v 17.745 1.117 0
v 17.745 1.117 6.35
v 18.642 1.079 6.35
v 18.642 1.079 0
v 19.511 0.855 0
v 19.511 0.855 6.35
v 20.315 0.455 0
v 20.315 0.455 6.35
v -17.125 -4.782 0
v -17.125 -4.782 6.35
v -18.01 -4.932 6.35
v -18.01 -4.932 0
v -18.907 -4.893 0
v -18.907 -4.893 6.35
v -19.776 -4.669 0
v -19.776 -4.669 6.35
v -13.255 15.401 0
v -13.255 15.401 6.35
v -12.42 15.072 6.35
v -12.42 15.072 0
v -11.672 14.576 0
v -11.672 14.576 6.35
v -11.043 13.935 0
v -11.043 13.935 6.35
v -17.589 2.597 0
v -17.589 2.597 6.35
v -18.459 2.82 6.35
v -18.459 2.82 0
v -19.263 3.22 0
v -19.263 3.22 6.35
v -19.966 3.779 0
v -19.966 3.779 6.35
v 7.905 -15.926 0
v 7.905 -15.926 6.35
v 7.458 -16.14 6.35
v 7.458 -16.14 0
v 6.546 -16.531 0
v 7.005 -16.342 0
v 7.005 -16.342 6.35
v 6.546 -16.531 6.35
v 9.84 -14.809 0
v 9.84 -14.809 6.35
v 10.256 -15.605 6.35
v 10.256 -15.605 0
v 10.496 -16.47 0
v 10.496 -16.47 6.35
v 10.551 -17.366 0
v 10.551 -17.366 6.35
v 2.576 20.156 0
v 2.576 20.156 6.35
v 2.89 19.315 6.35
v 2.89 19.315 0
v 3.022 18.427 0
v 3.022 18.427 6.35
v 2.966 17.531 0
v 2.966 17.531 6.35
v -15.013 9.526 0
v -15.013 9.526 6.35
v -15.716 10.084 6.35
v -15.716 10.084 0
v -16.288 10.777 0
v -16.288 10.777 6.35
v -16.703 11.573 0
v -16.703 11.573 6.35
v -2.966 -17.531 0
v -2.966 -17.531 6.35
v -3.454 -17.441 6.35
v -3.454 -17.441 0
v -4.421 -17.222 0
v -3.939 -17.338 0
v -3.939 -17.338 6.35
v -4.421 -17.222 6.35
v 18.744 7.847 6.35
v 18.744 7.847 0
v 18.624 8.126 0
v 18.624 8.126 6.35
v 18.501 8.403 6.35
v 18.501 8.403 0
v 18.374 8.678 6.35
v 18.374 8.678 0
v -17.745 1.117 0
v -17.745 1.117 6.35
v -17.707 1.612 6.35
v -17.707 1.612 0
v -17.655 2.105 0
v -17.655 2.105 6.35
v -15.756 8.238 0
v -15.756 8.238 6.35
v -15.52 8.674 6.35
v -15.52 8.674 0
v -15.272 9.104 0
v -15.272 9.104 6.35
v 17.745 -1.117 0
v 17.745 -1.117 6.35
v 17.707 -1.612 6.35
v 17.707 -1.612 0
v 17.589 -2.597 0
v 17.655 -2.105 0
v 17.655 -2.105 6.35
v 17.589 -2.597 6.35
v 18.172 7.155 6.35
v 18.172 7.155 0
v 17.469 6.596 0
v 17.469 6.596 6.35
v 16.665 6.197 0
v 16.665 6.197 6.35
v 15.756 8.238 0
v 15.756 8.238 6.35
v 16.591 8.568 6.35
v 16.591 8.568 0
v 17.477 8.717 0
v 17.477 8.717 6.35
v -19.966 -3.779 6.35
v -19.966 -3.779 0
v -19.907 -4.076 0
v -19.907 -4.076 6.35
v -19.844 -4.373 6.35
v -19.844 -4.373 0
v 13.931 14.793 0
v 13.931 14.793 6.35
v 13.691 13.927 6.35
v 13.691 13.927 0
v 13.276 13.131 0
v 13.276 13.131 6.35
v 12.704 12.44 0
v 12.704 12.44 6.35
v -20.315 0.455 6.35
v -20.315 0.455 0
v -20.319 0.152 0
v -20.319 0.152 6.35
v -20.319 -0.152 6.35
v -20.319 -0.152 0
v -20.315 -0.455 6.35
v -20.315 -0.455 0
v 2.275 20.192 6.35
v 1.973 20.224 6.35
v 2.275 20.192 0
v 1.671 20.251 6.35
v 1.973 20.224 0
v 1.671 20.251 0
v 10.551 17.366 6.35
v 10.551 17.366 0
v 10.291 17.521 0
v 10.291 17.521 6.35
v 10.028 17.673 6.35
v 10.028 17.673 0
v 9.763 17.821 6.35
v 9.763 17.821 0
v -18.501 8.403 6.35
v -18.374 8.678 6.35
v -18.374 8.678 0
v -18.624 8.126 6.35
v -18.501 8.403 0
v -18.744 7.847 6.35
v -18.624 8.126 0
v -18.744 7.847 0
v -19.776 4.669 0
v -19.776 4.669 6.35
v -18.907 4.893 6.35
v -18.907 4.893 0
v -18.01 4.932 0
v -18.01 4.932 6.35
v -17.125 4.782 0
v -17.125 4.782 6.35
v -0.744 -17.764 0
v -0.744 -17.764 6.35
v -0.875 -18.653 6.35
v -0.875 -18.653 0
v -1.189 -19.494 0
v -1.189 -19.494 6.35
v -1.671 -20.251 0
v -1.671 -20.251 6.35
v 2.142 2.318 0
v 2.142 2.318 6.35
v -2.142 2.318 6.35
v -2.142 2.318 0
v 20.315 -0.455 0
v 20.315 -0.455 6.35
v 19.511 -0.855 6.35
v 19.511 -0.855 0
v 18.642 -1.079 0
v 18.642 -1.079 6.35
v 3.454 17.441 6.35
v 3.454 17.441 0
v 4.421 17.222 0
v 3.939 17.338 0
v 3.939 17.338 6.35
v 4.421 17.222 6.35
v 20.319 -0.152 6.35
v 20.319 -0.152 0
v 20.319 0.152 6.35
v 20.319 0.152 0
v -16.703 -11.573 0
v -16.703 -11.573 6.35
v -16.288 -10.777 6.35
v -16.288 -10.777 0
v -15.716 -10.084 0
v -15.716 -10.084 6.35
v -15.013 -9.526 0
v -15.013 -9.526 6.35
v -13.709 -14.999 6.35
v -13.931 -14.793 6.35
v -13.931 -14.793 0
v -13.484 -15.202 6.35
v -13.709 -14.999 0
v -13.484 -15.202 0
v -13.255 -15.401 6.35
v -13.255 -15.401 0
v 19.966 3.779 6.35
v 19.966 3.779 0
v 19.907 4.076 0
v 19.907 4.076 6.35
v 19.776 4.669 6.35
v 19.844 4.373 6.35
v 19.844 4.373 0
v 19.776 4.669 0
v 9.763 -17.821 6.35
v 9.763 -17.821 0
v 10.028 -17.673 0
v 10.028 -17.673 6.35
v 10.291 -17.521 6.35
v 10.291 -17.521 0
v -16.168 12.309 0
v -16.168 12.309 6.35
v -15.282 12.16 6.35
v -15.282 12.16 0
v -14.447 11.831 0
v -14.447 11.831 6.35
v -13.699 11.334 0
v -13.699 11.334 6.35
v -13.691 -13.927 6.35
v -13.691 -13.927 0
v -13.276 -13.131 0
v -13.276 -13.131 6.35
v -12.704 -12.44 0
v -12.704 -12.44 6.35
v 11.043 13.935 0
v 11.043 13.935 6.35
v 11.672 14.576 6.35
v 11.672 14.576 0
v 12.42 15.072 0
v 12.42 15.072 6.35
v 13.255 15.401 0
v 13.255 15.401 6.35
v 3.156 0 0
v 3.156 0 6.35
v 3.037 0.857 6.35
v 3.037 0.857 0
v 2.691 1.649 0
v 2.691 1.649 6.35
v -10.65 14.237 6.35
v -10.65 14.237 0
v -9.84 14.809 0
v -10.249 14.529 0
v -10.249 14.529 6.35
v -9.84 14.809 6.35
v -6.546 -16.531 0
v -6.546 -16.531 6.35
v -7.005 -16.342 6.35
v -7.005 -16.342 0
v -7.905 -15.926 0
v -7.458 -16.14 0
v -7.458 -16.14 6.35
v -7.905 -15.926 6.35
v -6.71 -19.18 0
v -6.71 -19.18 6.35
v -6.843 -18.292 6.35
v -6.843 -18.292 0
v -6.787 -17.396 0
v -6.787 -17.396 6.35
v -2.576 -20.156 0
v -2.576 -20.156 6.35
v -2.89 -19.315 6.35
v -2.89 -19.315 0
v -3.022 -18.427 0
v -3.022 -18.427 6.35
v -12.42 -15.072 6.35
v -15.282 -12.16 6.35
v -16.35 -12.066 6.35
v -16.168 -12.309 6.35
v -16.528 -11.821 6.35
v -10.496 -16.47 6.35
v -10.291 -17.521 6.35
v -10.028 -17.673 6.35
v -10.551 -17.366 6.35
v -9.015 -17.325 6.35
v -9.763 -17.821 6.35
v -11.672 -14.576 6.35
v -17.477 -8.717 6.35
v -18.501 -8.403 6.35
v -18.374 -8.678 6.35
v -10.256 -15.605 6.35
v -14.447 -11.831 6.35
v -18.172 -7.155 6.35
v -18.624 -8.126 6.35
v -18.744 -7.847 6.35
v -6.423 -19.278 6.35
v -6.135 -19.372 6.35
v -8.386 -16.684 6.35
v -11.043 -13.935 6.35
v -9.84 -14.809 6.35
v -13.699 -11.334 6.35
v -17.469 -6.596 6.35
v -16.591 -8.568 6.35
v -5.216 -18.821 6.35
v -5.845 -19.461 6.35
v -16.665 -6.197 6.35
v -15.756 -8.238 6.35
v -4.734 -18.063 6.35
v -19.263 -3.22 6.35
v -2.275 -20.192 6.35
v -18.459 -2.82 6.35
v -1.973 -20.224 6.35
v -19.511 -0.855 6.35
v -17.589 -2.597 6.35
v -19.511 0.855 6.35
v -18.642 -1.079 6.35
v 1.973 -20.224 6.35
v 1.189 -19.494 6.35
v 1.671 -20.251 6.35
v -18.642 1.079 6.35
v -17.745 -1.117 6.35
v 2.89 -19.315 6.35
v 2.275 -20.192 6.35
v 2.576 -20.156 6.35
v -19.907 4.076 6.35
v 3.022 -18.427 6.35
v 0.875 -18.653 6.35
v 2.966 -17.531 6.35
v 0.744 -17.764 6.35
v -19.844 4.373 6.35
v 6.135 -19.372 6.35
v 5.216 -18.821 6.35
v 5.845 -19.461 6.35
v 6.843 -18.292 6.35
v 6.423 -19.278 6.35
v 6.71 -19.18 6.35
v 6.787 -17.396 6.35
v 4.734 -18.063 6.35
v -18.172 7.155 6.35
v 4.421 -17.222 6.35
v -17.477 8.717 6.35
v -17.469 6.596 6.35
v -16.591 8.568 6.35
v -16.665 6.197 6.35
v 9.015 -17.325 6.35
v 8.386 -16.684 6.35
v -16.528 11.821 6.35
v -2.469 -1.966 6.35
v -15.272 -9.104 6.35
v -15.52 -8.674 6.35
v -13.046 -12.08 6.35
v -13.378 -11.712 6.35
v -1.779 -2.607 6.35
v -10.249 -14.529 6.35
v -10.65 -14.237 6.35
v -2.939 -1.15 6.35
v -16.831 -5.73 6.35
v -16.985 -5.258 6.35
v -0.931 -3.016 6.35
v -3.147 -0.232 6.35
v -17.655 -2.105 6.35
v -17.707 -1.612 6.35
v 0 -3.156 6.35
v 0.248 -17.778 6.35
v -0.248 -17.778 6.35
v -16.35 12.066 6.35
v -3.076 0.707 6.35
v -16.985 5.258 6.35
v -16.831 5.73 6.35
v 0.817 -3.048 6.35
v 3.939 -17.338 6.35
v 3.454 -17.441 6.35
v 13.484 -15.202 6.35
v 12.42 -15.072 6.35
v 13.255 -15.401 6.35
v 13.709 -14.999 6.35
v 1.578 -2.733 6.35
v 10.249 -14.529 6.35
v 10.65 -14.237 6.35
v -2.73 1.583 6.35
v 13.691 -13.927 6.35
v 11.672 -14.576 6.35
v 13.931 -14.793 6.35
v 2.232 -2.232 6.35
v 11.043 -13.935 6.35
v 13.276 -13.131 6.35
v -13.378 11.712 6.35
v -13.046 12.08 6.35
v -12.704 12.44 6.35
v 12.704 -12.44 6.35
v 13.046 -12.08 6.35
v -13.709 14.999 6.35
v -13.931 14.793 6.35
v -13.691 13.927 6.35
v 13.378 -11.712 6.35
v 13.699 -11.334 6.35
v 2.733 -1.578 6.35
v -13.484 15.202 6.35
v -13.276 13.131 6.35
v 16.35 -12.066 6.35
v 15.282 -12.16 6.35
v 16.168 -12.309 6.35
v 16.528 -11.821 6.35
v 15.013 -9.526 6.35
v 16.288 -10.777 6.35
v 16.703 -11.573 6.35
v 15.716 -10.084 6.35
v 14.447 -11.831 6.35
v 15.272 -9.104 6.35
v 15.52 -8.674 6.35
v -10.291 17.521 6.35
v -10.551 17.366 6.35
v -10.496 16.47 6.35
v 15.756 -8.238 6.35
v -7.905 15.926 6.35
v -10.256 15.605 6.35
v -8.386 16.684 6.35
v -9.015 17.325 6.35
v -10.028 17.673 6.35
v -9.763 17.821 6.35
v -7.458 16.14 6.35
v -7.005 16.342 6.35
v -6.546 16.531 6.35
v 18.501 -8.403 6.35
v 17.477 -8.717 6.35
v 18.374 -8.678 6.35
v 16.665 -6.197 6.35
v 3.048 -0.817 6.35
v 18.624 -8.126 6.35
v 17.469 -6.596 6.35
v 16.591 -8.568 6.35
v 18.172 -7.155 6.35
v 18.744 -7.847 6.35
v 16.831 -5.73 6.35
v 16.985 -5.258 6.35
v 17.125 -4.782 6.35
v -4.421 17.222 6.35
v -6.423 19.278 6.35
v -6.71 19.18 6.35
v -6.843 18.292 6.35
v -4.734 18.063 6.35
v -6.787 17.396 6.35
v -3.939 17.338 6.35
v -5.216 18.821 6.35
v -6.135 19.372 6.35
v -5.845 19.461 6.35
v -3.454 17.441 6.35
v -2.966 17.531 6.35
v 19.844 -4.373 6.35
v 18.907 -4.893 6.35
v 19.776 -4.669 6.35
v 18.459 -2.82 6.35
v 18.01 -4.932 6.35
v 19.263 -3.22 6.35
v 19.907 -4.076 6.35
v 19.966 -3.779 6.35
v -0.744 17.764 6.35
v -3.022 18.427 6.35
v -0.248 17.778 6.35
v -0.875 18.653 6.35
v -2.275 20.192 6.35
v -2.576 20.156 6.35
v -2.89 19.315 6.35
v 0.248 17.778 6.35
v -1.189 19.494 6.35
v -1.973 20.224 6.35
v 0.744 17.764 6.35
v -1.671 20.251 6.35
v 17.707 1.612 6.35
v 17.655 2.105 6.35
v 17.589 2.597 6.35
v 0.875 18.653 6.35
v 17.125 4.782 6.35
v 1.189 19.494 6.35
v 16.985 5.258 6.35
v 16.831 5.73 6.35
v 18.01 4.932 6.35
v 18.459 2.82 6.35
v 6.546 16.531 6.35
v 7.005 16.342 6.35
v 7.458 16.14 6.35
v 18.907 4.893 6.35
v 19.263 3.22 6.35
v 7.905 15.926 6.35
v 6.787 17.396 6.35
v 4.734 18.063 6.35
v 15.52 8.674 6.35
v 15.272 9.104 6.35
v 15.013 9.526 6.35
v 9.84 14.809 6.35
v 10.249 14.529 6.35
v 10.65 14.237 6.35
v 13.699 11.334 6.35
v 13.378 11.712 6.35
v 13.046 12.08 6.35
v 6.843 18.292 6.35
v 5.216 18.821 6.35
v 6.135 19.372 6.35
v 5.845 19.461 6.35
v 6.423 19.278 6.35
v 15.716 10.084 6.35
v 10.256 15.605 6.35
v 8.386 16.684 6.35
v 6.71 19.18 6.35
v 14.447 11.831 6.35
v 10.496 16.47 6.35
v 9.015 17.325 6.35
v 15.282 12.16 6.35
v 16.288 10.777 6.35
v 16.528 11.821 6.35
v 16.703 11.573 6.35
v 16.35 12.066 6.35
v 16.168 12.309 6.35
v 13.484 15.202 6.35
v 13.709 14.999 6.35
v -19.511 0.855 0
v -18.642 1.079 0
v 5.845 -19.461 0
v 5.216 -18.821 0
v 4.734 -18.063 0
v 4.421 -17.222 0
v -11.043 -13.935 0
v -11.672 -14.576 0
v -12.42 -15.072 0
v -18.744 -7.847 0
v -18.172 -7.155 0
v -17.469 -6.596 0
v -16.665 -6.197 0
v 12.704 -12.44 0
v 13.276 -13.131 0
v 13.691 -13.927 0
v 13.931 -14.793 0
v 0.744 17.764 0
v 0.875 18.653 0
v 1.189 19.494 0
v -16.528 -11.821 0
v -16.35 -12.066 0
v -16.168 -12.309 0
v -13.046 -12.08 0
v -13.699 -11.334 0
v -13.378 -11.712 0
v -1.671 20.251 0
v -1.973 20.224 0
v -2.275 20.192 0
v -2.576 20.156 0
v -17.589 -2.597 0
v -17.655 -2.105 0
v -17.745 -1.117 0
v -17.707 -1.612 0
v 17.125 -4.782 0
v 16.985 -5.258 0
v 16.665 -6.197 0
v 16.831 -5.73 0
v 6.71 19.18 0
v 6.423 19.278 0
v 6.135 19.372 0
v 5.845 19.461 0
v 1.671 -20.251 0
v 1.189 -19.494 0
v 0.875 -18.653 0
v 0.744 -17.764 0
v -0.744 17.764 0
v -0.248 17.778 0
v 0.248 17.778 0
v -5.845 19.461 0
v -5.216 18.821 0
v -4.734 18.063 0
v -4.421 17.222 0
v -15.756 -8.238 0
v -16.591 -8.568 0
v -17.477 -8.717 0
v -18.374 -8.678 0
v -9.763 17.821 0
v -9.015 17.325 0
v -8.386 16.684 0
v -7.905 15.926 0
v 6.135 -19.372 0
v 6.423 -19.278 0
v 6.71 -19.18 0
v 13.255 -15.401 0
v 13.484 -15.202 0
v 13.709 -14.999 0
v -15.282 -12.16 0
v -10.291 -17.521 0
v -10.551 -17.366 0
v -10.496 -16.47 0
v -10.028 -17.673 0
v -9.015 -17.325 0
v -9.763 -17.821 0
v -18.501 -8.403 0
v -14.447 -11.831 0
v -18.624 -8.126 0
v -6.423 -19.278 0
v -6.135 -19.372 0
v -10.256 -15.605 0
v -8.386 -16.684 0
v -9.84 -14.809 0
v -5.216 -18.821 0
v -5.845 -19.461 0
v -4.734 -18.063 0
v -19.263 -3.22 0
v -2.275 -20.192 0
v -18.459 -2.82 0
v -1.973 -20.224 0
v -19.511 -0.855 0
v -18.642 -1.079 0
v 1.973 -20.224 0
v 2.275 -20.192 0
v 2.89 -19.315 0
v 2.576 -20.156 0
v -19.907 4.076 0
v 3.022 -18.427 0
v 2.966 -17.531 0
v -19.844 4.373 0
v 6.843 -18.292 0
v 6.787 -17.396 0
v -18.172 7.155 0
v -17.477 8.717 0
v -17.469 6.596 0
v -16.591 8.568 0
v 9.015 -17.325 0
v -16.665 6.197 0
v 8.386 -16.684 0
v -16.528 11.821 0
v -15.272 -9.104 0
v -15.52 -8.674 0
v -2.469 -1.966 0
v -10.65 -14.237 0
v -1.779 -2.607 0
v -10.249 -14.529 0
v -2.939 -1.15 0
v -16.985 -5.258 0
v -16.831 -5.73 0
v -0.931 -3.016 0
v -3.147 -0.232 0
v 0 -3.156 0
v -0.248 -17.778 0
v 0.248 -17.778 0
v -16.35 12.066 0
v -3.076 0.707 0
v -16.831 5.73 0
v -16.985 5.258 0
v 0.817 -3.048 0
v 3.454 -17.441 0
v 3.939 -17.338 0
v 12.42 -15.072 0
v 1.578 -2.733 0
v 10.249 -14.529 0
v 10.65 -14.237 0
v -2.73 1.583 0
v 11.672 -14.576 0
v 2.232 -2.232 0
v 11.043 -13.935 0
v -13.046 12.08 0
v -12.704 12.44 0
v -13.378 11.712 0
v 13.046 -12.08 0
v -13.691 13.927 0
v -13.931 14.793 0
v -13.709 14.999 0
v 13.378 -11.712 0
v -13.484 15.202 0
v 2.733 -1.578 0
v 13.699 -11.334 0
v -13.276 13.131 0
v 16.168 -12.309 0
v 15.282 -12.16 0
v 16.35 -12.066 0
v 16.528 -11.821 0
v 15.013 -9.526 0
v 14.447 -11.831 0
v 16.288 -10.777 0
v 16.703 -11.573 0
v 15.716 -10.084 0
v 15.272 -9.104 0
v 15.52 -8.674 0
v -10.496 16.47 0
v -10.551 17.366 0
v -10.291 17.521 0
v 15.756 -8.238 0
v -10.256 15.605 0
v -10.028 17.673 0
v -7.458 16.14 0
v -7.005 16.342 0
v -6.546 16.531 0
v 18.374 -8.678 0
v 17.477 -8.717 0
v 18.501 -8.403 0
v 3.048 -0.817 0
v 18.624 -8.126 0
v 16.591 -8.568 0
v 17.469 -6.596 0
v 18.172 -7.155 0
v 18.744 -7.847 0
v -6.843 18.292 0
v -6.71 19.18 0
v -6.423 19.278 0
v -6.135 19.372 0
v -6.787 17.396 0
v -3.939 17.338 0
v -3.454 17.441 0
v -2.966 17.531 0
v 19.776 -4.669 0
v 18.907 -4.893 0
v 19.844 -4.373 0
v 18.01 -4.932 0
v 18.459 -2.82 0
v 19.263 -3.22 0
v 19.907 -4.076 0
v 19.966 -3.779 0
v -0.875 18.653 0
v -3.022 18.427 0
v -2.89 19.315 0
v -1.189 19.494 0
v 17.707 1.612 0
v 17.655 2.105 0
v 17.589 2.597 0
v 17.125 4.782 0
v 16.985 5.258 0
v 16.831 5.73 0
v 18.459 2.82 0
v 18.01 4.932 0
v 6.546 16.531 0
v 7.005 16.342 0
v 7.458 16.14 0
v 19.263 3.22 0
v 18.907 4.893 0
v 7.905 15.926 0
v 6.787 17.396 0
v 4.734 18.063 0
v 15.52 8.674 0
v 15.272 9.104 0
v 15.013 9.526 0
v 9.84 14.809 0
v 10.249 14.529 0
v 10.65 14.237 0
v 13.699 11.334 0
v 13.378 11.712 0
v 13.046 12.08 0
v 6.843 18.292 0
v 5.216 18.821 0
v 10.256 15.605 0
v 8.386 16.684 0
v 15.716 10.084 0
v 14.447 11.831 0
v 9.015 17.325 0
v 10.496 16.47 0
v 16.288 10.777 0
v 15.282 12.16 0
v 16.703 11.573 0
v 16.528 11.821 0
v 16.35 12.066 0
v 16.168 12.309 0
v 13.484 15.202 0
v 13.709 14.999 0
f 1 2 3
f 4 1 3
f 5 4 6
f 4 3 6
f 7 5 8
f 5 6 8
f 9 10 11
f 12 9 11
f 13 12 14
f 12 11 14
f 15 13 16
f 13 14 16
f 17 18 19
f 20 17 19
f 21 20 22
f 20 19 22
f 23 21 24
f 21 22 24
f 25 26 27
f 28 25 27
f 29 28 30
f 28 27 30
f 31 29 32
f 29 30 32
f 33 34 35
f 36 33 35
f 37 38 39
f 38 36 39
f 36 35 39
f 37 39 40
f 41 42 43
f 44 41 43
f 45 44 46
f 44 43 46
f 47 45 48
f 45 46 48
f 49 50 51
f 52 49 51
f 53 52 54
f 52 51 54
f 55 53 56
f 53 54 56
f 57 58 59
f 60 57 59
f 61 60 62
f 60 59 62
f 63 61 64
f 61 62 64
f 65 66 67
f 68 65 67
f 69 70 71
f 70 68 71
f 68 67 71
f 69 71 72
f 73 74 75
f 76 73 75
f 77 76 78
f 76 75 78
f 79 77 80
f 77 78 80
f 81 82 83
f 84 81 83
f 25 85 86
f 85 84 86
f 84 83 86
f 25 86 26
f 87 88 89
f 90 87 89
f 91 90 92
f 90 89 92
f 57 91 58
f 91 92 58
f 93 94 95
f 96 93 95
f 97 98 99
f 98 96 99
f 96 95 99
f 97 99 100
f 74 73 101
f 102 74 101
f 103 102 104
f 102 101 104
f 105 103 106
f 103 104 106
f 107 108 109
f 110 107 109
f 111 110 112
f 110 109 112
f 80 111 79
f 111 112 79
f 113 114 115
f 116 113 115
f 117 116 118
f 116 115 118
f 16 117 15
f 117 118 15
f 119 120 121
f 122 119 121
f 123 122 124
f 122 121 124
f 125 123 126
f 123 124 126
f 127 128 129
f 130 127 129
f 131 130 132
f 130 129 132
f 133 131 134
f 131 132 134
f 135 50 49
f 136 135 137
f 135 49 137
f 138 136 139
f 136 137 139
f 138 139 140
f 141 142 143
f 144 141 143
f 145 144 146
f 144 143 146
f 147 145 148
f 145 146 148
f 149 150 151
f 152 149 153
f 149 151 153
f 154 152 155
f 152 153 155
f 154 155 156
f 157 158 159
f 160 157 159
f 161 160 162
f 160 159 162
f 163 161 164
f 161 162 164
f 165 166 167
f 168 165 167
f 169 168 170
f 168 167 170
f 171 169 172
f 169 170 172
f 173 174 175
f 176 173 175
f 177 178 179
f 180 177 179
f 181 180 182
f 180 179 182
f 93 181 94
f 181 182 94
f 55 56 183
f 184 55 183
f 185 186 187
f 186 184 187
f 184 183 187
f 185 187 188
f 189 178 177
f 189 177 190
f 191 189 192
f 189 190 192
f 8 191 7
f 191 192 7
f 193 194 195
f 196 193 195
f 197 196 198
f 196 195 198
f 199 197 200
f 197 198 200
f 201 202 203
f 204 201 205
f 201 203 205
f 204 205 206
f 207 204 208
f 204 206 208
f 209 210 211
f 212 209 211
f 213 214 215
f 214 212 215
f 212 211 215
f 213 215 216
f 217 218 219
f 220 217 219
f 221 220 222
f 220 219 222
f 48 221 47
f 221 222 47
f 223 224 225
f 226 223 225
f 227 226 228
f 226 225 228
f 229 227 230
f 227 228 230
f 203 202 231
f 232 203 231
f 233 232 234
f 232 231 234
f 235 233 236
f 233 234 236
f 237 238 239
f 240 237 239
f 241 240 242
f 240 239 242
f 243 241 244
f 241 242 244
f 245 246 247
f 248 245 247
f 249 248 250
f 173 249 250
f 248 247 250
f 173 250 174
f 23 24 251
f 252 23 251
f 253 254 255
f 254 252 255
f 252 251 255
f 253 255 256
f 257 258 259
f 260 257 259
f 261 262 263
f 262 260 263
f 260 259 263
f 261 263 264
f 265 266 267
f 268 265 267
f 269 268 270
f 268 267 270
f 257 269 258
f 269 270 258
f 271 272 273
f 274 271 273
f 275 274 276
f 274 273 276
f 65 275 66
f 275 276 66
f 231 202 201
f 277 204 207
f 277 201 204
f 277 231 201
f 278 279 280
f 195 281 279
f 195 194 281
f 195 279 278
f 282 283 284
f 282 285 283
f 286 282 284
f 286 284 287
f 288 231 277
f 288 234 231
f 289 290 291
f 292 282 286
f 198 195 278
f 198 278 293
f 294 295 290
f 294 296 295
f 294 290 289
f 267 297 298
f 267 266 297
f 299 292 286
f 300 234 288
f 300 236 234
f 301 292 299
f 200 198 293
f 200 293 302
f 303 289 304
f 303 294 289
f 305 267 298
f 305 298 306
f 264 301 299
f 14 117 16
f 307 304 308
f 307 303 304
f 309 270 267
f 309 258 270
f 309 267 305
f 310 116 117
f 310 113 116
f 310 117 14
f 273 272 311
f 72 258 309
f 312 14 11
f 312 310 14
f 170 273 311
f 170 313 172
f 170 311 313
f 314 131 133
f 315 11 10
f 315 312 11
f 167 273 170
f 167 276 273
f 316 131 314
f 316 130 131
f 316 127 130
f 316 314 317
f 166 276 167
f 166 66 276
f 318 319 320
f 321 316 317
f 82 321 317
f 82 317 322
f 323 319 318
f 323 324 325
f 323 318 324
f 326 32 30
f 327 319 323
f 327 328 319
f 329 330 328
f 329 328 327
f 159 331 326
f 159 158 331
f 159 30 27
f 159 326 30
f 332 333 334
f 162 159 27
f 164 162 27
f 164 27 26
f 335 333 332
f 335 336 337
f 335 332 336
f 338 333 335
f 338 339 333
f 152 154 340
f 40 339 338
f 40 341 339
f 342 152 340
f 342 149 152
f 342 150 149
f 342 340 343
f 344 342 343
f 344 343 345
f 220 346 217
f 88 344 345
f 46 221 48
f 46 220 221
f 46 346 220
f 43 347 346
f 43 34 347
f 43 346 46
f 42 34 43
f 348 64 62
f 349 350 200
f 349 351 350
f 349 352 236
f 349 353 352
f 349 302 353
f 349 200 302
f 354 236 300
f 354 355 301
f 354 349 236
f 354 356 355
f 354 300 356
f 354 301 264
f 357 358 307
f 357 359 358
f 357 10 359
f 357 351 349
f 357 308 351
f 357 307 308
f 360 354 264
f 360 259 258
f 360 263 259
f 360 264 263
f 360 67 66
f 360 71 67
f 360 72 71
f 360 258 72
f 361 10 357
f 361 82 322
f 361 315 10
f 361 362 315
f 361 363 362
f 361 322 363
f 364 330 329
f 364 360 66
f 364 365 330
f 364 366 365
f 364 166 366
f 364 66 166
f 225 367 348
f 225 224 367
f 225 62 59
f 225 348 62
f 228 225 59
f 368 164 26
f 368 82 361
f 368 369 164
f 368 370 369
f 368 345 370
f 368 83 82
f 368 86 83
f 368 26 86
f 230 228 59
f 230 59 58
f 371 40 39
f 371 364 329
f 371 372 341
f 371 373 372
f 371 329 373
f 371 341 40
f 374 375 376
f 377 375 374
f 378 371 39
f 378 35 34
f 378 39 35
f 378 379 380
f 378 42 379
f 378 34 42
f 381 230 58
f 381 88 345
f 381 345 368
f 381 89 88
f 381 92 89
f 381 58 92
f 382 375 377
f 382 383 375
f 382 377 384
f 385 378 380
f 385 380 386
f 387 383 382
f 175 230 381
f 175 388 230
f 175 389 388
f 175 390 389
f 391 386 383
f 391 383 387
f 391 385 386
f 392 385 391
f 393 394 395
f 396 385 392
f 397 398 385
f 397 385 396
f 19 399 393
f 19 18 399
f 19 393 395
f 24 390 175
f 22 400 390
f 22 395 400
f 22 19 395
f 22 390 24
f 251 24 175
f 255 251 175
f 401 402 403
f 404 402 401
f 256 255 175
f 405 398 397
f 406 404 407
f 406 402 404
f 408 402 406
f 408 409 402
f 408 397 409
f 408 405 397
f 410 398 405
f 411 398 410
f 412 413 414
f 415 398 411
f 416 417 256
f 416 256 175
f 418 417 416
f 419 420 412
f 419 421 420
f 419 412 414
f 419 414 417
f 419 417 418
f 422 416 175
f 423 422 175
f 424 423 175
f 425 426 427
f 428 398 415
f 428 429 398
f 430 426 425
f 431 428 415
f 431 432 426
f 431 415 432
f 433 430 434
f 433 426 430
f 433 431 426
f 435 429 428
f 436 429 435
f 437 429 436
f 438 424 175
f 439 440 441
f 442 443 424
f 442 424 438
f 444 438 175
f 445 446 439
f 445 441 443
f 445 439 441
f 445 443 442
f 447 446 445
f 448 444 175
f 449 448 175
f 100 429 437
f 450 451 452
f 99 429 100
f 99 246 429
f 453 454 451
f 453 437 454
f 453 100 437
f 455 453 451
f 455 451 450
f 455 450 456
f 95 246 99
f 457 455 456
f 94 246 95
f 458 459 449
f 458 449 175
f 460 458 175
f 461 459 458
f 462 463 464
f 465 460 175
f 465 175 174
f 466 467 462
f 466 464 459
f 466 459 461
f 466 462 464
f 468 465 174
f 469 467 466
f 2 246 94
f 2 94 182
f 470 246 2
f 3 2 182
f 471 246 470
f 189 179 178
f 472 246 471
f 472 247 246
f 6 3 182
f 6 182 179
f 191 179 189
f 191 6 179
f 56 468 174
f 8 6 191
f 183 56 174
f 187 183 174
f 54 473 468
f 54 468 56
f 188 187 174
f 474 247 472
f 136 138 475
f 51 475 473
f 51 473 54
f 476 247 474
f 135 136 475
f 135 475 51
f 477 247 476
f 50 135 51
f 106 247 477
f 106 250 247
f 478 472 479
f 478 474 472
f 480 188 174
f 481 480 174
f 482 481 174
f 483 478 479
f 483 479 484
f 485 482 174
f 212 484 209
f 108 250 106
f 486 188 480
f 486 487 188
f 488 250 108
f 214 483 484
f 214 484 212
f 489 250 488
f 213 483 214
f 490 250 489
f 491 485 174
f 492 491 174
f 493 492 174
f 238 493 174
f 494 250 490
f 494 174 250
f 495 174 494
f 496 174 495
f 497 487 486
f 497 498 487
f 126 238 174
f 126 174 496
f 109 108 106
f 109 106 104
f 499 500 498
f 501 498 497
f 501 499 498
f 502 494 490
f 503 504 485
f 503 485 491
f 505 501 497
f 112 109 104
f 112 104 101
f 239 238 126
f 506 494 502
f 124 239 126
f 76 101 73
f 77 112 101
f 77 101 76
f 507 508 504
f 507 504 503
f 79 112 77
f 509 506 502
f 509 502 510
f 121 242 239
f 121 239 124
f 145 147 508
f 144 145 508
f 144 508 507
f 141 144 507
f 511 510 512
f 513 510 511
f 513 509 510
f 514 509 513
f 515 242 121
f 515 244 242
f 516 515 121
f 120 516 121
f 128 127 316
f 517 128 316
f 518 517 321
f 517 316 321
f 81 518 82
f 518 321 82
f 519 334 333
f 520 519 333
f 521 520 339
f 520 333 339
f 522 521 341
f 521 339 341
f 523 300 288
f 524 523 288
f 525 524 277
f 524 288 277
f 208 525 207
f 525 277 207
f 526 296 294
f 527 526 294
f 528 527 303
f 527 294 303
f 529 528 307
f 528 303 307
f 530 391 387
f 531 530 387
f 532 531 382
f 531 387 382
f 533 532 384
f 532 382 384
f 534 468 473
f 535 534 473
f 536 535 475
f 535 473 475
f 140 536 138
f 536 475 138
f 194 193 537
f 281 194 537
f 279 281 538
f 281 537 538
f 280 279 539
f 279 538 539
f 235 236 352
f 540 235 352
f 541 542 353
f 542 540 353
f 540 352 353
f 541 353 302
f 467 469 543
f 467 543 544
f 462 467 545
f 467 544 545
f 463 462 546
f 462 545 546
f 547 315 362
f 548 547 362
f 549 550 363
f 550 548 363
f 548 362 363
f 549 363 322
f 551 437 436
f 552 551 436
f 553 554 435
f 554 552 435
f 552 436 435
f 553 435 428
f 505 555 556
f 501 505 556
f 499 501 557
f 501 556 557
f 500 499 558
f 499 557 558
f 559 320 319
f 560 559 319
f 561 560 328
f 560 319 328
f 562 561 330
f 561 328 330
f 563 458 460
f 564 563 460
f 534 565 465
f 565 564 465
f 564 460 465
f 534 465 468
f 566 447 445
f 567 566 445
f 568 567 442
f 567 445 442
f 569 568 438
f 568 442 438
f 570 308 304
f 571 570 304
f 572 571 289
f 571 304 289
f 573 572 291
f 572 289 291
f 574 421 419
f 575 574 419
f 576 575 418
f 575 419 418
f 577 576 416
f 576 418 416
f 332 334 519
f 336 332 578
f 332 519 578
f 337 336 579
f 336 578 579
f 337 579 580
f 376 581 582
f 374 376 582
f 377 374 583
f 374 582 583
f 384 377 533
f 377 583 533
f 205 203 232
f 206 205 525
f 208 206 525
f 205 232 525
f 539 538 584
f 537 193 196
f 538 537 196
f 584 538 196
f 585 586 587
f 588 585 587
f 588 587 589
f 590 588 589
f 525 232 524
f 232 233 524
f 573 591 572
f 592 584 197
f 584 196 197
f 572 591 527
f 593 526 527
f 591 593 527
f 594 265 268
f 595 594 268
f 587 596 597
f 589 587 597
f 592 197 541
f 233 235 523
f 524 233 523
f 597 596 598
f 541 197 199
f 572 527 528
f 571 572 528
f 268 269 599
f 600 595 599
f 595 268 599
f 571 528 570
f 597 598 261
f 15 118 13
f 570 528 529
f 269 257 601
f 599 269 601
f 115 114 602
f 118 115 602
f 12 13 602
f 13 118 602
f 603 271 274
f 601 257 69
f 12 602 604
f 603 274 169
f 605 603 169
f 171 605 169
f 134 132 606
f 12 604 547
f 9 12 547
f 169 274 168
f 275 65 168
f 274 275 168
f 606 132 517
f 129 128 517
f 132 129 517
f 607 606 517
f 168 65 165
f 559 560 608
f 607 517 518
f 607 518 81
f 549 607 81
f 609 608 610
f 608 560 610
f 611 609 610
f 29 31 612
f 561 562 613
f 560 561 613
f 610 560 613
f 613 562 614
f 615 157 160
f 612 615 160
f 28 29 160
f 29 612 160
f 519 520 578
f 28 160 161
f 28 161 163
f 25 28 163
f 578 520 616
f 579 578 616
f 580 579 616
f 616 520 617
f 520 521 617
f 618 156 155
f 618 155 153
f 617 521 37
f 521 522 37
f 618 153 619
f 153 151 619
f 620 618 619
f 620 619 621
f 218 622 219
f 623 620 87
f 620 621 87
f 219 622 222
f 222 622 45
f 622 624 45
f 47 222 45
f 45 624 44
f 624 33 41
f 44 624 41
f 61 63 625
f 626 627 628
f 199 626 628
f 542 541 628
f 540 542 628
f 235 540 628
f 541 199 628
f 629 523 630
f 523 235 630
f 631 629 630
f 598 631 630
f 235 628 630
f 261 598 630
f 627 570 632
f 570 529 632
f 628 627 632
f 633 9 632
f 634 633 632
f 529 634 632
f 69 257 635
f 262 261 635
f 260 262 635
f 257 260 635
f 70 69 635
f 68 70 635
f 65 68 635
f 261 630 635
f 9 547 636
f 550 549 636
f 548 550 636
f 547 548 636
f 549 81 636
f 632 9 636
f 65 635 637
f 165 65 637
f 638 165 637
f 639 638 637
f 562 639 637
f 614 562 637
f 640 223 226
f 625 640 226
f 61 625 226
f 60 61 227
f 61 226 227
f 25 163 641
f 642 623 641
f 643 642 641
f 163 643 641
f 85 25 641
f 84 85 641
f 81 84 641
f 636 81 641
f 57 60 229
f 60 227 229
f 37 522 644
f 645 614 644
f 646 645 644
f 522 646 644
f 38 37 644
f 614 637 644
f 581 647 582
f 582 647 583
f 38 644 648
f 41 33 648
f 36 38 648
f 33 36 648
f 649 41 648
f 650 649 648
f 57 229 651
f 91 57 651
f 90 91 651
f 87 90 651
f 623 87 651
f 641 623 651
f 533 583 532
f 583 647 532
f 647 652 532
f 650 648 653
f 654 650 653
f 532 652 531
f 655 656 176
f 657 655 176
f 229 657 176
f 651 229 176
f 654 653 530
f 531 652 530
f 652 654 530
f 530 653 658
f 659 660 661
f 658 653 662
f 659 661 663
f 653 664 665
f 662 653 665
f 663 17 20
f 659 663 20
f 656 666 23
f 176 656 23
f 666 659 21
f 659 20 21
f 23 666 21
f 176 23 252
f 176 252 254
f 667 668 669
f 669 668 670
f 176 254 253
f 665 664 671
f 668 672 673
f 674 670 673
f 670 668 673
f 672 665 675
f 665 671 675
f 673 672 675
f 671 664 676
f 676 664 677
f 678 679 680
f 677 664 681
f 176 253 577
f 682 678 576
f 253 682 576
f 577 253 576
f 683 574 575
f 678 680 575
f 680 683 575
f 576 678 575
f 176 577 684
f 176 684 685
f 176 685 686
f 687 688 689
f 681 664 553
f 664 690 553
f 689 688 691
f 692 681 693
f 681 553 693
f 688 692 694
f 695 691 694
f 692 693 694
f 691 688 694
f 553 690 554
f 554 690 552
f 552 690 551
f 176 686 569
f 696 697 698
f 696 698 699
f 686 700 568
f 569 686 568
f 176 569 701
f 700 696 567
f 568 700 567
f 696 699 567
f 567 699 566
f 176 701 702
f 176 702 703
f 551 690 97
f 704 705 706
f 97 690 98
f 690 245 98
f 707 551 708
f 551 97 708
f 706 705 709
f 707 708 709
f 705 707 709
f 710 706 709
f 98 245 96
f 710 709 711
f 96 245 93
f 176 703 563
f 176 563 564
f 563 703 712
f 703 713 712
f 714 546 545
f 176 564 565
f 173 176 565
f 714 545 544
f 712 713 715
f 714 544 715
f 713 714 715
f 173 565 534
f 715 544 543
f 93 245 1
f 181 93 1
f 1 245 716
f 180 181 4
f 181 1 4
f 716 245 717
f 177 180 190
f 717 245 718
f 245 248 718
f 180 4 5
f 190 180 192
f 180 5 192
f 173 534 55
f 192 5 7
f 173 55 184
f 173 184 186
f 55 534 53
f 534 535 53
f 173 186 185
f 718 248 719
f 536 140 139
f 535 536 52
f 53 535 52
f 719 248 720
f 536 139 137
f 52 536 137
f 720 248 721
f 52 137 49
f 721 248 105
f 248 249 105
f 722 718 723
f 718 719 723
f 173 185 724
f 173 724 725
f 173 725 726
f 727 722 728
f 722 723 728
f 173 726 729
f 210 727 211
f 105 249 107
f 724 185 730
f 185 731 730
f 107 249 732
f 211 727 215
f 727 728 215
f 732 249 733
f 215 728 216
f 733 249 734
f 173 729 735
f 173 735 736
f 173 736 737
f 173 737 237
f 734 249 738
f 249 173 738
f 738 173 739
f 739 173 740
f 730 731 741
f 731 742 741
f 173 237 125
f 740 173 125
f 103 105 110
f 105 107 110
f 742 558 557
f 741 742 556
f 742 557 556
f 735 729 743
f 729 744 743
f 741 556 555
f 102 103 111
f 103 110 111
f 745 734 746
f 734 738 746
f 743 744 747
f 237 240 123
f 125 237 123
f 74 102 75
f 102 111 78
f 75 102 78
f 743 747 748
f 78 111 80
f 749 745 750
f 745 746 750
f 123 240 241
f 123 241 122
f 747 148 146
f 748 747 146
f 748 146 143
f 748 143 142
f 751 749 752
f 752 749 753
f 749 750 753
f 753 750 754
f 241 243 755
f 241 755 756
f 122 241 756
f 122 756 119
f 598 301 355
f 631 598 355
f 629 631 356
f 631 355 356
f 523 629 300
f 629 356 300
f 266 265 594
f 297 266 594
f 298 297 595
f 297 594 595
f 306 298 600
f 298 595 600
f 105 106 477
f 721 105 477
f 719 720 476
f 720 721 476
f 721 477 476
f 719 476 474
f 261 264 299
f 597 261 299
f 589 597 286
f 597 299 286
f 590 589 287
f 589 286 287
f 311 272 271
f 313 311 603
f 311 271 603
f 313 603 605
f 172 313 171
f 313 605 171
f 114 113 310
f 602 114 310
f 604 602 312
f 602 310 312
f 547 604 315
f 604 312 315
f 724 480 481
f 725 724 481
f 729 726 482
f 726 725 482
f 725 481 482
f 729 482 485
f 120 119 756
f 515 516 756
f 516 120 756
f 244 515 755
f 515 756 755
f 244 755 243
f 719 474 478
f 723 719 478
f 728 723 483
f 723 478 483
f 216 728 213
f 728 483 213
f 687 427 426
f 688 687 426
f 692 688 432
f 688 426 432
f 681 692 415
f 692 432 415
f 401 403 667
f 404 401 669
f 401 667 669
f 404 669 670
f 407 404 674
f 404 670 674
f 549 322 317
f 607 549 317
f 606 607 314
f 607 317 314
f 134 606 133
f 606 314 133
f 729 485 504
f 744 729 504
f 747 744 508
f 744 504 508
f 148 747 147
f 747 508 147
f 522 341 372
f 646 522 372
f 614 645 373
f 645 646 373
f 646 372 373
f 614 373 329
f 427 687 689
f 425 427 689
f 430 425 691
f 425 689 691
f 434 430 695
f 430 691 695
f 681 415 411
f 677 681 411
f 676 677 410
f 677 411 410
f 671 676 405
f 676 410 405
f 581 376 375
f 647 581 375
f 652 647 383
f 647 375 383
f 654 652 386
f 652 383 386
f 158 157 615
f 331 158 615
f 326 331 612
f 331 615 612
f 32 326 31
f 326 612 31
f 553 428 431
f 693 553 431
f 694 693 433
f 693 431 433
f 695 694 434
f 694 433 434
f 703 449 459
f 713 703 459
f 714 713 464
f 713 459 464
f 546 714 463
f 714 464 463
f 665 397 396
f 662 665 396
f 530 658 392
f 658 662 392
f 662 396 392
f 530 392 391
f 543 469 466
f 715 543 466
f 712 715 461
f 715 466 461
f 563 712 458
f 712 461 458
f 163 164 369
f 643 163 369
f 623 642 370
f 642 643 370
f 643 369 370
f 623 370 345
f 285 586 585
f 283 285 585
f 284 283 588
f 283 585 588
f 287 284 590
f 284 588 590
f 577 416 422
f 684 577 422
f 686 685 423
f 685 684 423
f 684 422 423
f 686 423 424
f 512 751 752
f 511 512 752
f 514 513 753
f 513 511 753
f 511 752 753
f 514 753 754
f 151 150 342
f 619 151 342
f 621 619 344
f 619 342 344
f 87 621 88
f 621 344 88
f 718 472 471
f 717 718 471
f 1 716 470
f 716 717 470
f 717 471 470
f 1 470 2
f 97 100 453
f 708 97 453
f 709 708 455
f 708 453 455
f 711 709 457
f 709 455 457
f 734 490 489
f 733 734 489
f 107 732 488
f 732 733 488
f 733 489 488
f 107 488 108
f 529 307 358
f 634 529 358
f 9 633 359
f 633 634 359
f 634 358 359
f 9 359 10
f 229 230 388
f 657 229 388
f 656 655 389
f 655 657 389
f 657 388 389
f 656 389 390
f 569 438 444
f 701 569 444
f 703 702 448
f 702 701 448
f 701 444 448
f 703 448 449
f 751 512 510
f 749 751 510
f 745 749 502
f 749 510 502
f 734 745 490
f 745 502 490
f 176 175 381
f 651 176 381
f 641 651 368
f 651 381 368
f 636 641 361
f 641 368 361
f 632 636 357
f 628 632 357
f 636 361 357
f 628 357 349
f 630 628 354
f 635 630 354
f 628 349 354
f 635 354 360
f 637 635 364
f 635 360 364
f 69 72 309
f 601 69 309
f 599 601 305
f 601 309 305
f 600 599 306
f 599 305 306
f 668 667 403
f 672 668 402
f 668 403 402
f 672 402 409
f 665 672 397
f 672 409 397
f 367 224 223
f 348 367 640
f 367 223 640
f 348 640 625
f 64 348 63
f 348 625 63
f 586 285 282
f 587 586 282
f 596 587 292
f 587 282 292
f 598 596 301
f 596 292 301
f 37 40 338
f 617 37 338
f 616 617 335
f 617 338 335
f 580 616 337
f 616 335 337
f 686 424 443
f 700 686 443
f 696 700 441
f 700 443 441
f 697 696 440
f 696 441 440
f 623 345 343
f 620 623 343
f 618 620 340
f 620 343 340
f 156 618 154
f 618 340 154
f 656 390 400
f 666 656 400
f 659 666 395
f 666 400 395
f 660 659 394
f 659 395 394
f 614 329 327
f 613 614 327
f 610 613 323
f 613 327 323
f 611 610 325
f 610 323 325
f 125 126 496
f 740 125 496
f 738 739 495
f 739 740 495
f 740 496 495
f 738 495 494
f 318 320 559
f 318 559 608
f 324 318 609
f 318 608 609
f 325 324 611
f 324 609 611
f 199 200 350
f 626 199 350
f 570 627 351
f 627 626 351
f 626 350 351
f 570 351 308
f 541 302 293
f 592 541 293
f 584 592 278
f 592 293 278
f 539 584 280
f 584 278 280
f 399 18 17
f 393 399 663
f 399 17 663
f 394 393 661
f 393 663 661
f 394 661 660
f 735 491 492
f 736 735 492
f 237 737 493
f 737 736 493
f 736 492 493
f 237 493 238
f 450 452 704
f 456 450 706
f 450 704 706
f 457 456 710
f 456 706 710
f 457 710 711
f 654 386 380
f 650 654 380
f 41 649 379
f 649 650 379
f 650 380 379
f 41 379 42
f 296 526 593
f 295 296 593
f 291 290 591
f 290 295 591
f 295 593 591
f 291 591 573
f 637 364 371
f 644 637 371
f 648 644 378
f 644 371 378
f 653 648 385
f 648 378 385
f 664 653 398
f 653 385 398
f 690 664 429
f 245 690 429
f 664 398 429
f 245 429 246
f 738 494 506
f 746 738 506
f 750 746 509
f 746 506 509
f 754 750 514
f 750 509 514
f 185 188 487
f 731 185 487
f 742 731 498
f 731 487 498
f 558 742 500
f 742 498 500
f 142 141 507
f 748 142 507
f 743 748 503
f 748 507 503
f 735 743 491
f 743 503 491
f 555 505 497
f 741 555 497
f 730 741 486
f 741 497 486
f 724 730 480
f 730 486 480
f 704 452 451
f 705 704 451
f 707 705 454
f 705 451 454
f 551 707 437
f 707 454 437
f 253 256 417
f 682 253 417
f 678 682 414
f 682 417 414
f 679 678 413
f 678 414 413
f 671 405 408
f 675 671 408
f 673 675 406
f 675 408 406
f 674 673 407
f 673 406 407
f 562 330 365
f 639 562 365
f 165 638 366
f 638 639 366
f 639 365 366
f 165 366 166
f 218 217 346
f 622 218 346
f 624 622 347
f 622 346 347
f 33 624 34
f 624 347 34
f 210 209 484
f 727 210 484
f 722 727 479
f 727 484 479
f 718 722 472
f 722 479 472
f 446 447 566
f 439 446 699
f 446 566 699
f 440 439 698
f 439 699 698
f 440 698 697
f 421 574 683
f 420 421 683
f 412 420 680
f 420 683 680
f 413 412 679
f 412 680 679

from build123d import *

# Parameters (mm, degrees)
SKETCH1_R           = 20.32
OUTER_CIRCLE_DEPTH  = 6.35
TOOTH_CUT_DEPTH     = 30.430040775
TEETH_PATTERN_COUNT = 30
CUT_EXTRUDE1_DEPTH  = 30.382561533


with BuildPart() as part:
    # Sketch1 → Outer Circle (new body)
    with BuildSketch(Plane.XY):
        Circle(SKETCH1_R)
    extrude(amount=OUTER_CIRCLE_DEPTH)

    # Sketch2 → Tooth Cut (cut, through all)
    with BuildSketch(Plane.XY.offset(6.35)):
        with BuildLine():
            ThreePointArc((-0.743845606, 17.764433391), (0, 17.78), (0.743845606, 17.764433391))
            ThreePointArc((0.743845606, 17.764433391), (1.009950749, 19.081439594), (1.671040922, 20.251173355))
            ThreePointArc((1.671040922, 20.251173355), (0, 20.32), (-1.671040922, 20.251173355))
            ThreePointArc((-1.671040922, 20.251173355), (-1.009950749, 19.081439594), (-0.743845606, 17.764433391))
        make_face()
    tooth_cut = extrude(amount=-TOOTH_CUT_DEPTH, mode=Mode.SUBTRACT)

    # Teeth Pattern: Tooth Cut ×30 about axis
    teeth_pattern_axis = Axis((0, 0, 0), (0, 0, 1))
    for i in range(1, TEETH_PATTERN_COUNT):
        add(tooth_cut.rotate(teeth_pattern_axis, i * 360 / TEETH_PATTERN_COUNT), mode=Mode.SUBTRACT)

    # Sketch3 → Cut-Extrude1 (cut, through all)
    with BuildSketch(Plane.XY.offset(6.35)):
        with BuildLine():
            Line((0, 2.31775), (-2.141974636, 2.31775))
            ThreePointArc((-2.141974636, 2.31775), (-2.938938883, -1.150068974), (0, -3.15595))
            Line((0, -3.15595), (0, 2.31775))
        make_face()
        with BuildLine():
            Line((2.141974636, 2.31775), (0, 2.31775))
            Line((0, 2.31775), (0, -3.15595))
            ThreePointArc((0, -3.15595), (2.231593646, -2.231593646), (3.15595, 0))
            ThreePointArc((3.15595, 0), (2.891365184, 1.264922043), (2.141974636, 2.31775))
        make_face()
    extrude(amount=-CUT_EXTRUDE1_DEPTH, mode=Mode.SUBTRACT)


solid = part.part
